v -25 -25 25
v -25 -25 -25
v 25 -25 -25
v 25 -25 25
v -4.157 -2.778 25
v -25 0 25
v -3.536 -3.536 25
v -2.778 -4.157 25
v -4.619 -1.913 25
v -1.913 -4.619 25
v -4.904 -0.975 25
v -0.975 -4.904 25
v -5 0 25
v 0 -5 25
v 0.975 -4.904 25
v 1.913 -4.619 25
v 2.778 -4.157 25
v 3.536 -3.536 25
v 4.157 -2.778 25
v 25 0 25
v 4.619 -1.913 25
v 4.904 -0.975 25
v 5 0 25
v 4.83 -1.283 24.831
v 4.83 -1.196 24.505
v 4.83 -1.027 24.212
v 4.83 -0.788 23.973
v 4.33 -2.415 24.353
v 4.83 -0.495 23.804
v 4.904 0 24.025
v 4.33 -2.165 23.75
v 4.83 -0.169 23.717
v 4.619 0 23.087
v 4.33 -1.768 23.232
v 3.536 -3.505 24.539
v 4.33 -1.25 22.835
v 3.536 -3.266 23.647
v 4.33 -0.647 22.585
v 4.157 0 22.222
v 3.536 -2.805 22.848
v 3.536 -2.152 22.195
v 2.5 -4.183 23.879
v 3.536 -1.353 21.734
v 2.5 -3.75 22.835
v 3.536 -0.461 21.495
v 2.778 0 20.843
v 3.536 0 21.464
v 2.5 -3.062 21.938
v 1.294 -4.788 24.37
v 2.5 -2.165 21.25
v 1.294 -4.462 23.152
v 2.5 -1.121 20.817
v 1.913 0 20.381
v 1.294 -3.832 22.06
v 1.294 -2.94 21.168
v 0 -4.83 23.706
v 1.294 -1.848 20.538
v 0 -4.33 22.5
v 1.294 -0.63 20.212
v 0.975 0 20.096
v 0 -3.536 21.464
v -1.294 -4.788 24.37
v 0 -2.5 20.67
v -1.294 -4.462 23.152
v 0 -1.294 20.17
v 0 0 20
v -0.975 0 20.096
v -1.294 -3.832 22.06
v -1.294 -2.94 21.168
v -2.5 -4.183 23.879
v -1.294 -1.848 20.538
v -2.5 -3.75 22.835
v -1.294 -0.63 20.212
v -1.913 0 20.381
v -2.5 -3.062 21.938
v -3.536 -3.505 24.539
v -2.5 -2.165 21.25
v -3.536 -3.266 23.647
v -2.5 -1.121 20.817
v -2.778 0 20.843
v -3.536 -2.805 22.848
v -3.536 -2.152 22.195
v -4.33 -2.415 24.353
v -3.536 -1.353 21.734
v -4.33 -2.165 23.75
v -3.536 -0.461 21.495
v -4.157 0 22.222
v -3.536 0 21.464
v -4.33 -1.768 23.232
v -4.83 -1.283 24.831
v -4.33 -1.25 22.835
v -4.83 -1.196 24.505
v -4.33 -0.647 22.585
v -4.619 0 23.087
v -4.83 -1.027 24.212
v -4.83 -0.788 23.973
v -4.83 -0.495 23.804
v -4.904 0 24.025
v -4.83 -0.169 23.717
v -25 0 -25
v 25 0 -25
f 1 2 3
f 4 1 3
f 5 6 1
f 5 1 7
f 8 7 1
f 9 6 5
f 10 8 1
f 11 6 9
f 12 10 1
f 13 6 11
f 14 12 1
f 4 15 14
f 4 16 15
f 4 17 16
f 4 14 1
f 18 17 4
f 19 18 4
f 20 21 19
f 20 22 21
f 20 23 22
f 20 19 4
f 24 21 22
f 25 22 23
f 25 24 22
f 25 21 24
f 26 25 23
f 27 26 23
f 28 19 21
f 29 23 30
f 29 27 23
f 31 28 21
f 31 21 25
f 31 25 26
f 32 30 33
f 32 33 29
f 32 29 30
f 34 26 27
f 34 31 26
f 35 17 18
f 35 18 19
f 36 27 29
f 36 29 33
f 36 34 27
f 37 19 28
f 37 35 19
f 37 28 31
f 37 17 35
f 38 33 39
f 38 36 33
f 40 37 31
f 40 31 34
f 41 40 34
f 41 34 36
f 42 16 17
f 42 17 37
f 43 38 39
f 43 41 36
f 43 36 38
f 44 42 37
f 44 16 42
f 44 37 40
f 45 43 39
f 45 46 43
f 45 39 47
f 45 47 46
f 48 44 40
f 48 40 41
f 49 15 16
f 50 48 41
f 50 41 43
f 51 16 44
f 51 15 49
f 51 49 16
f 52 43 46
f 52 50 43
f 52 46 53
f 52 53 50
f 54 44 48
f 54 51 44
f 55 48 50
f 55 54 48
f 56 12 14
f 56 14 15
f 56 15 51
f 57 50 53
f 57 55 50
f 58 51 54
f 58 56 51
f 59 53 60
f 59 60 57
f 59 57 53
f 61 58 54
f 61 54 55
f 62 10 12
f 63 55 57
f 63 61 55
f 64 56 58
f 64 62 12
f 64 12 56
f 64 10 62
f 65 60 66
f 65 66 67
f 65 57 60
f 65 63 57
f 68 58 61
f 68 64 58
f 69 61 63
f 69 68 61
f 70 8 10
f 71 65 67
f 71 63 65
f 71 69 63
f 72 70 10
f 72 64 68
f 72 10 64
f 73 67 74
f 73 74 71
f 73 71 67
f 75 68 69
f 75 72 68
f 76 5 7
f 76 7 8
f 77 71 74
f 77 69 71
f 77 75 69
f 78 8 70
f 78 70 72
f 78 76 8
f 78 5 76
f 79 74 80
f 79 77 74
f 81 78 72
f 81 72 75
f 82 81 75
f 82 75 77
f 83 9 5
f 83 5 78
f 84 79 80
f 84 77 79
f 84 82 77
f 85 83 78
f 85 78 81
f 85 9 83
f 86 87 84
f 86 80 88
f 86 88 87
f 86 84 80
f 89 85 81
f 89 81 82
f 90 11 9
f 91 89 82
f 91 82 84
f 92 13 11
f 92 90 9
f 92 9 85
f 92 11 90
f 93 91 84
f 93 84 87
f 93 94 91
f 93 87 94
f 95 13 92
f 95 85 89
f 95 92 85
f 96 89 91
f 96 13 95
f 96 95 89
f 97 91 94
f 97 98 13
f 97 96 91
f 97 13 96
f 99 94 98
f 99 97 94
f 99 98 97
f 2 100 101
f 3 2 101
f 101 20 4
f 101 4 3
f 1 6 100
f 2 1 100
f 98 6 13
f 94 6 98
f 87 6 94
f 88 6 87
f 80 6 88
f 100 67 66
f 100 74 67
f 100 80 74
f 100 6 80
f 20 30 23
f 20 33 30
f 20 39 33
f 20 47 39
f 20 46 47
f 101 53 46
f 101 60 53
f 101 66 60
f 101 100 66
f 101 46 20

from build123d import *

# Parameters (mm, degrees)
SKETCH2_W           = 50
SKETCH2_H           = 50
BOSS_EXTRUDE1_DEPTH = 25


with BuildPart() as part:
    # Sketch2 → Boss-Extrude1 (new body)
    with BuildSketch(Plane(origin=(0, 0, 0), x_dir=(1, 0, 0), z_dir=(0, 1, 0))):
        Rectangle(SKETCH2_W, SKETCH2_H)
    extrude(amount=-BOSS_EXTRUDE1_DEPTH)

    # Sketch3 → Cut-Revolve1 (revolve, cut)
    with BuildSketch(Plane(origin=(0, 0, 0), x_dir=(1, 0, 0), z_dir=(0, 1, 0))):
        with BuildLine():
            Line((-5, -25), (5, -25))
            ThreePointArc((5, -25), (0, -20), (-5, -25))
        make_face()
    revolve(axis=Axis((-5, 0, 25), (1, 0, 0)), mode=Mode.SUBTRACT)


solid = part.part
